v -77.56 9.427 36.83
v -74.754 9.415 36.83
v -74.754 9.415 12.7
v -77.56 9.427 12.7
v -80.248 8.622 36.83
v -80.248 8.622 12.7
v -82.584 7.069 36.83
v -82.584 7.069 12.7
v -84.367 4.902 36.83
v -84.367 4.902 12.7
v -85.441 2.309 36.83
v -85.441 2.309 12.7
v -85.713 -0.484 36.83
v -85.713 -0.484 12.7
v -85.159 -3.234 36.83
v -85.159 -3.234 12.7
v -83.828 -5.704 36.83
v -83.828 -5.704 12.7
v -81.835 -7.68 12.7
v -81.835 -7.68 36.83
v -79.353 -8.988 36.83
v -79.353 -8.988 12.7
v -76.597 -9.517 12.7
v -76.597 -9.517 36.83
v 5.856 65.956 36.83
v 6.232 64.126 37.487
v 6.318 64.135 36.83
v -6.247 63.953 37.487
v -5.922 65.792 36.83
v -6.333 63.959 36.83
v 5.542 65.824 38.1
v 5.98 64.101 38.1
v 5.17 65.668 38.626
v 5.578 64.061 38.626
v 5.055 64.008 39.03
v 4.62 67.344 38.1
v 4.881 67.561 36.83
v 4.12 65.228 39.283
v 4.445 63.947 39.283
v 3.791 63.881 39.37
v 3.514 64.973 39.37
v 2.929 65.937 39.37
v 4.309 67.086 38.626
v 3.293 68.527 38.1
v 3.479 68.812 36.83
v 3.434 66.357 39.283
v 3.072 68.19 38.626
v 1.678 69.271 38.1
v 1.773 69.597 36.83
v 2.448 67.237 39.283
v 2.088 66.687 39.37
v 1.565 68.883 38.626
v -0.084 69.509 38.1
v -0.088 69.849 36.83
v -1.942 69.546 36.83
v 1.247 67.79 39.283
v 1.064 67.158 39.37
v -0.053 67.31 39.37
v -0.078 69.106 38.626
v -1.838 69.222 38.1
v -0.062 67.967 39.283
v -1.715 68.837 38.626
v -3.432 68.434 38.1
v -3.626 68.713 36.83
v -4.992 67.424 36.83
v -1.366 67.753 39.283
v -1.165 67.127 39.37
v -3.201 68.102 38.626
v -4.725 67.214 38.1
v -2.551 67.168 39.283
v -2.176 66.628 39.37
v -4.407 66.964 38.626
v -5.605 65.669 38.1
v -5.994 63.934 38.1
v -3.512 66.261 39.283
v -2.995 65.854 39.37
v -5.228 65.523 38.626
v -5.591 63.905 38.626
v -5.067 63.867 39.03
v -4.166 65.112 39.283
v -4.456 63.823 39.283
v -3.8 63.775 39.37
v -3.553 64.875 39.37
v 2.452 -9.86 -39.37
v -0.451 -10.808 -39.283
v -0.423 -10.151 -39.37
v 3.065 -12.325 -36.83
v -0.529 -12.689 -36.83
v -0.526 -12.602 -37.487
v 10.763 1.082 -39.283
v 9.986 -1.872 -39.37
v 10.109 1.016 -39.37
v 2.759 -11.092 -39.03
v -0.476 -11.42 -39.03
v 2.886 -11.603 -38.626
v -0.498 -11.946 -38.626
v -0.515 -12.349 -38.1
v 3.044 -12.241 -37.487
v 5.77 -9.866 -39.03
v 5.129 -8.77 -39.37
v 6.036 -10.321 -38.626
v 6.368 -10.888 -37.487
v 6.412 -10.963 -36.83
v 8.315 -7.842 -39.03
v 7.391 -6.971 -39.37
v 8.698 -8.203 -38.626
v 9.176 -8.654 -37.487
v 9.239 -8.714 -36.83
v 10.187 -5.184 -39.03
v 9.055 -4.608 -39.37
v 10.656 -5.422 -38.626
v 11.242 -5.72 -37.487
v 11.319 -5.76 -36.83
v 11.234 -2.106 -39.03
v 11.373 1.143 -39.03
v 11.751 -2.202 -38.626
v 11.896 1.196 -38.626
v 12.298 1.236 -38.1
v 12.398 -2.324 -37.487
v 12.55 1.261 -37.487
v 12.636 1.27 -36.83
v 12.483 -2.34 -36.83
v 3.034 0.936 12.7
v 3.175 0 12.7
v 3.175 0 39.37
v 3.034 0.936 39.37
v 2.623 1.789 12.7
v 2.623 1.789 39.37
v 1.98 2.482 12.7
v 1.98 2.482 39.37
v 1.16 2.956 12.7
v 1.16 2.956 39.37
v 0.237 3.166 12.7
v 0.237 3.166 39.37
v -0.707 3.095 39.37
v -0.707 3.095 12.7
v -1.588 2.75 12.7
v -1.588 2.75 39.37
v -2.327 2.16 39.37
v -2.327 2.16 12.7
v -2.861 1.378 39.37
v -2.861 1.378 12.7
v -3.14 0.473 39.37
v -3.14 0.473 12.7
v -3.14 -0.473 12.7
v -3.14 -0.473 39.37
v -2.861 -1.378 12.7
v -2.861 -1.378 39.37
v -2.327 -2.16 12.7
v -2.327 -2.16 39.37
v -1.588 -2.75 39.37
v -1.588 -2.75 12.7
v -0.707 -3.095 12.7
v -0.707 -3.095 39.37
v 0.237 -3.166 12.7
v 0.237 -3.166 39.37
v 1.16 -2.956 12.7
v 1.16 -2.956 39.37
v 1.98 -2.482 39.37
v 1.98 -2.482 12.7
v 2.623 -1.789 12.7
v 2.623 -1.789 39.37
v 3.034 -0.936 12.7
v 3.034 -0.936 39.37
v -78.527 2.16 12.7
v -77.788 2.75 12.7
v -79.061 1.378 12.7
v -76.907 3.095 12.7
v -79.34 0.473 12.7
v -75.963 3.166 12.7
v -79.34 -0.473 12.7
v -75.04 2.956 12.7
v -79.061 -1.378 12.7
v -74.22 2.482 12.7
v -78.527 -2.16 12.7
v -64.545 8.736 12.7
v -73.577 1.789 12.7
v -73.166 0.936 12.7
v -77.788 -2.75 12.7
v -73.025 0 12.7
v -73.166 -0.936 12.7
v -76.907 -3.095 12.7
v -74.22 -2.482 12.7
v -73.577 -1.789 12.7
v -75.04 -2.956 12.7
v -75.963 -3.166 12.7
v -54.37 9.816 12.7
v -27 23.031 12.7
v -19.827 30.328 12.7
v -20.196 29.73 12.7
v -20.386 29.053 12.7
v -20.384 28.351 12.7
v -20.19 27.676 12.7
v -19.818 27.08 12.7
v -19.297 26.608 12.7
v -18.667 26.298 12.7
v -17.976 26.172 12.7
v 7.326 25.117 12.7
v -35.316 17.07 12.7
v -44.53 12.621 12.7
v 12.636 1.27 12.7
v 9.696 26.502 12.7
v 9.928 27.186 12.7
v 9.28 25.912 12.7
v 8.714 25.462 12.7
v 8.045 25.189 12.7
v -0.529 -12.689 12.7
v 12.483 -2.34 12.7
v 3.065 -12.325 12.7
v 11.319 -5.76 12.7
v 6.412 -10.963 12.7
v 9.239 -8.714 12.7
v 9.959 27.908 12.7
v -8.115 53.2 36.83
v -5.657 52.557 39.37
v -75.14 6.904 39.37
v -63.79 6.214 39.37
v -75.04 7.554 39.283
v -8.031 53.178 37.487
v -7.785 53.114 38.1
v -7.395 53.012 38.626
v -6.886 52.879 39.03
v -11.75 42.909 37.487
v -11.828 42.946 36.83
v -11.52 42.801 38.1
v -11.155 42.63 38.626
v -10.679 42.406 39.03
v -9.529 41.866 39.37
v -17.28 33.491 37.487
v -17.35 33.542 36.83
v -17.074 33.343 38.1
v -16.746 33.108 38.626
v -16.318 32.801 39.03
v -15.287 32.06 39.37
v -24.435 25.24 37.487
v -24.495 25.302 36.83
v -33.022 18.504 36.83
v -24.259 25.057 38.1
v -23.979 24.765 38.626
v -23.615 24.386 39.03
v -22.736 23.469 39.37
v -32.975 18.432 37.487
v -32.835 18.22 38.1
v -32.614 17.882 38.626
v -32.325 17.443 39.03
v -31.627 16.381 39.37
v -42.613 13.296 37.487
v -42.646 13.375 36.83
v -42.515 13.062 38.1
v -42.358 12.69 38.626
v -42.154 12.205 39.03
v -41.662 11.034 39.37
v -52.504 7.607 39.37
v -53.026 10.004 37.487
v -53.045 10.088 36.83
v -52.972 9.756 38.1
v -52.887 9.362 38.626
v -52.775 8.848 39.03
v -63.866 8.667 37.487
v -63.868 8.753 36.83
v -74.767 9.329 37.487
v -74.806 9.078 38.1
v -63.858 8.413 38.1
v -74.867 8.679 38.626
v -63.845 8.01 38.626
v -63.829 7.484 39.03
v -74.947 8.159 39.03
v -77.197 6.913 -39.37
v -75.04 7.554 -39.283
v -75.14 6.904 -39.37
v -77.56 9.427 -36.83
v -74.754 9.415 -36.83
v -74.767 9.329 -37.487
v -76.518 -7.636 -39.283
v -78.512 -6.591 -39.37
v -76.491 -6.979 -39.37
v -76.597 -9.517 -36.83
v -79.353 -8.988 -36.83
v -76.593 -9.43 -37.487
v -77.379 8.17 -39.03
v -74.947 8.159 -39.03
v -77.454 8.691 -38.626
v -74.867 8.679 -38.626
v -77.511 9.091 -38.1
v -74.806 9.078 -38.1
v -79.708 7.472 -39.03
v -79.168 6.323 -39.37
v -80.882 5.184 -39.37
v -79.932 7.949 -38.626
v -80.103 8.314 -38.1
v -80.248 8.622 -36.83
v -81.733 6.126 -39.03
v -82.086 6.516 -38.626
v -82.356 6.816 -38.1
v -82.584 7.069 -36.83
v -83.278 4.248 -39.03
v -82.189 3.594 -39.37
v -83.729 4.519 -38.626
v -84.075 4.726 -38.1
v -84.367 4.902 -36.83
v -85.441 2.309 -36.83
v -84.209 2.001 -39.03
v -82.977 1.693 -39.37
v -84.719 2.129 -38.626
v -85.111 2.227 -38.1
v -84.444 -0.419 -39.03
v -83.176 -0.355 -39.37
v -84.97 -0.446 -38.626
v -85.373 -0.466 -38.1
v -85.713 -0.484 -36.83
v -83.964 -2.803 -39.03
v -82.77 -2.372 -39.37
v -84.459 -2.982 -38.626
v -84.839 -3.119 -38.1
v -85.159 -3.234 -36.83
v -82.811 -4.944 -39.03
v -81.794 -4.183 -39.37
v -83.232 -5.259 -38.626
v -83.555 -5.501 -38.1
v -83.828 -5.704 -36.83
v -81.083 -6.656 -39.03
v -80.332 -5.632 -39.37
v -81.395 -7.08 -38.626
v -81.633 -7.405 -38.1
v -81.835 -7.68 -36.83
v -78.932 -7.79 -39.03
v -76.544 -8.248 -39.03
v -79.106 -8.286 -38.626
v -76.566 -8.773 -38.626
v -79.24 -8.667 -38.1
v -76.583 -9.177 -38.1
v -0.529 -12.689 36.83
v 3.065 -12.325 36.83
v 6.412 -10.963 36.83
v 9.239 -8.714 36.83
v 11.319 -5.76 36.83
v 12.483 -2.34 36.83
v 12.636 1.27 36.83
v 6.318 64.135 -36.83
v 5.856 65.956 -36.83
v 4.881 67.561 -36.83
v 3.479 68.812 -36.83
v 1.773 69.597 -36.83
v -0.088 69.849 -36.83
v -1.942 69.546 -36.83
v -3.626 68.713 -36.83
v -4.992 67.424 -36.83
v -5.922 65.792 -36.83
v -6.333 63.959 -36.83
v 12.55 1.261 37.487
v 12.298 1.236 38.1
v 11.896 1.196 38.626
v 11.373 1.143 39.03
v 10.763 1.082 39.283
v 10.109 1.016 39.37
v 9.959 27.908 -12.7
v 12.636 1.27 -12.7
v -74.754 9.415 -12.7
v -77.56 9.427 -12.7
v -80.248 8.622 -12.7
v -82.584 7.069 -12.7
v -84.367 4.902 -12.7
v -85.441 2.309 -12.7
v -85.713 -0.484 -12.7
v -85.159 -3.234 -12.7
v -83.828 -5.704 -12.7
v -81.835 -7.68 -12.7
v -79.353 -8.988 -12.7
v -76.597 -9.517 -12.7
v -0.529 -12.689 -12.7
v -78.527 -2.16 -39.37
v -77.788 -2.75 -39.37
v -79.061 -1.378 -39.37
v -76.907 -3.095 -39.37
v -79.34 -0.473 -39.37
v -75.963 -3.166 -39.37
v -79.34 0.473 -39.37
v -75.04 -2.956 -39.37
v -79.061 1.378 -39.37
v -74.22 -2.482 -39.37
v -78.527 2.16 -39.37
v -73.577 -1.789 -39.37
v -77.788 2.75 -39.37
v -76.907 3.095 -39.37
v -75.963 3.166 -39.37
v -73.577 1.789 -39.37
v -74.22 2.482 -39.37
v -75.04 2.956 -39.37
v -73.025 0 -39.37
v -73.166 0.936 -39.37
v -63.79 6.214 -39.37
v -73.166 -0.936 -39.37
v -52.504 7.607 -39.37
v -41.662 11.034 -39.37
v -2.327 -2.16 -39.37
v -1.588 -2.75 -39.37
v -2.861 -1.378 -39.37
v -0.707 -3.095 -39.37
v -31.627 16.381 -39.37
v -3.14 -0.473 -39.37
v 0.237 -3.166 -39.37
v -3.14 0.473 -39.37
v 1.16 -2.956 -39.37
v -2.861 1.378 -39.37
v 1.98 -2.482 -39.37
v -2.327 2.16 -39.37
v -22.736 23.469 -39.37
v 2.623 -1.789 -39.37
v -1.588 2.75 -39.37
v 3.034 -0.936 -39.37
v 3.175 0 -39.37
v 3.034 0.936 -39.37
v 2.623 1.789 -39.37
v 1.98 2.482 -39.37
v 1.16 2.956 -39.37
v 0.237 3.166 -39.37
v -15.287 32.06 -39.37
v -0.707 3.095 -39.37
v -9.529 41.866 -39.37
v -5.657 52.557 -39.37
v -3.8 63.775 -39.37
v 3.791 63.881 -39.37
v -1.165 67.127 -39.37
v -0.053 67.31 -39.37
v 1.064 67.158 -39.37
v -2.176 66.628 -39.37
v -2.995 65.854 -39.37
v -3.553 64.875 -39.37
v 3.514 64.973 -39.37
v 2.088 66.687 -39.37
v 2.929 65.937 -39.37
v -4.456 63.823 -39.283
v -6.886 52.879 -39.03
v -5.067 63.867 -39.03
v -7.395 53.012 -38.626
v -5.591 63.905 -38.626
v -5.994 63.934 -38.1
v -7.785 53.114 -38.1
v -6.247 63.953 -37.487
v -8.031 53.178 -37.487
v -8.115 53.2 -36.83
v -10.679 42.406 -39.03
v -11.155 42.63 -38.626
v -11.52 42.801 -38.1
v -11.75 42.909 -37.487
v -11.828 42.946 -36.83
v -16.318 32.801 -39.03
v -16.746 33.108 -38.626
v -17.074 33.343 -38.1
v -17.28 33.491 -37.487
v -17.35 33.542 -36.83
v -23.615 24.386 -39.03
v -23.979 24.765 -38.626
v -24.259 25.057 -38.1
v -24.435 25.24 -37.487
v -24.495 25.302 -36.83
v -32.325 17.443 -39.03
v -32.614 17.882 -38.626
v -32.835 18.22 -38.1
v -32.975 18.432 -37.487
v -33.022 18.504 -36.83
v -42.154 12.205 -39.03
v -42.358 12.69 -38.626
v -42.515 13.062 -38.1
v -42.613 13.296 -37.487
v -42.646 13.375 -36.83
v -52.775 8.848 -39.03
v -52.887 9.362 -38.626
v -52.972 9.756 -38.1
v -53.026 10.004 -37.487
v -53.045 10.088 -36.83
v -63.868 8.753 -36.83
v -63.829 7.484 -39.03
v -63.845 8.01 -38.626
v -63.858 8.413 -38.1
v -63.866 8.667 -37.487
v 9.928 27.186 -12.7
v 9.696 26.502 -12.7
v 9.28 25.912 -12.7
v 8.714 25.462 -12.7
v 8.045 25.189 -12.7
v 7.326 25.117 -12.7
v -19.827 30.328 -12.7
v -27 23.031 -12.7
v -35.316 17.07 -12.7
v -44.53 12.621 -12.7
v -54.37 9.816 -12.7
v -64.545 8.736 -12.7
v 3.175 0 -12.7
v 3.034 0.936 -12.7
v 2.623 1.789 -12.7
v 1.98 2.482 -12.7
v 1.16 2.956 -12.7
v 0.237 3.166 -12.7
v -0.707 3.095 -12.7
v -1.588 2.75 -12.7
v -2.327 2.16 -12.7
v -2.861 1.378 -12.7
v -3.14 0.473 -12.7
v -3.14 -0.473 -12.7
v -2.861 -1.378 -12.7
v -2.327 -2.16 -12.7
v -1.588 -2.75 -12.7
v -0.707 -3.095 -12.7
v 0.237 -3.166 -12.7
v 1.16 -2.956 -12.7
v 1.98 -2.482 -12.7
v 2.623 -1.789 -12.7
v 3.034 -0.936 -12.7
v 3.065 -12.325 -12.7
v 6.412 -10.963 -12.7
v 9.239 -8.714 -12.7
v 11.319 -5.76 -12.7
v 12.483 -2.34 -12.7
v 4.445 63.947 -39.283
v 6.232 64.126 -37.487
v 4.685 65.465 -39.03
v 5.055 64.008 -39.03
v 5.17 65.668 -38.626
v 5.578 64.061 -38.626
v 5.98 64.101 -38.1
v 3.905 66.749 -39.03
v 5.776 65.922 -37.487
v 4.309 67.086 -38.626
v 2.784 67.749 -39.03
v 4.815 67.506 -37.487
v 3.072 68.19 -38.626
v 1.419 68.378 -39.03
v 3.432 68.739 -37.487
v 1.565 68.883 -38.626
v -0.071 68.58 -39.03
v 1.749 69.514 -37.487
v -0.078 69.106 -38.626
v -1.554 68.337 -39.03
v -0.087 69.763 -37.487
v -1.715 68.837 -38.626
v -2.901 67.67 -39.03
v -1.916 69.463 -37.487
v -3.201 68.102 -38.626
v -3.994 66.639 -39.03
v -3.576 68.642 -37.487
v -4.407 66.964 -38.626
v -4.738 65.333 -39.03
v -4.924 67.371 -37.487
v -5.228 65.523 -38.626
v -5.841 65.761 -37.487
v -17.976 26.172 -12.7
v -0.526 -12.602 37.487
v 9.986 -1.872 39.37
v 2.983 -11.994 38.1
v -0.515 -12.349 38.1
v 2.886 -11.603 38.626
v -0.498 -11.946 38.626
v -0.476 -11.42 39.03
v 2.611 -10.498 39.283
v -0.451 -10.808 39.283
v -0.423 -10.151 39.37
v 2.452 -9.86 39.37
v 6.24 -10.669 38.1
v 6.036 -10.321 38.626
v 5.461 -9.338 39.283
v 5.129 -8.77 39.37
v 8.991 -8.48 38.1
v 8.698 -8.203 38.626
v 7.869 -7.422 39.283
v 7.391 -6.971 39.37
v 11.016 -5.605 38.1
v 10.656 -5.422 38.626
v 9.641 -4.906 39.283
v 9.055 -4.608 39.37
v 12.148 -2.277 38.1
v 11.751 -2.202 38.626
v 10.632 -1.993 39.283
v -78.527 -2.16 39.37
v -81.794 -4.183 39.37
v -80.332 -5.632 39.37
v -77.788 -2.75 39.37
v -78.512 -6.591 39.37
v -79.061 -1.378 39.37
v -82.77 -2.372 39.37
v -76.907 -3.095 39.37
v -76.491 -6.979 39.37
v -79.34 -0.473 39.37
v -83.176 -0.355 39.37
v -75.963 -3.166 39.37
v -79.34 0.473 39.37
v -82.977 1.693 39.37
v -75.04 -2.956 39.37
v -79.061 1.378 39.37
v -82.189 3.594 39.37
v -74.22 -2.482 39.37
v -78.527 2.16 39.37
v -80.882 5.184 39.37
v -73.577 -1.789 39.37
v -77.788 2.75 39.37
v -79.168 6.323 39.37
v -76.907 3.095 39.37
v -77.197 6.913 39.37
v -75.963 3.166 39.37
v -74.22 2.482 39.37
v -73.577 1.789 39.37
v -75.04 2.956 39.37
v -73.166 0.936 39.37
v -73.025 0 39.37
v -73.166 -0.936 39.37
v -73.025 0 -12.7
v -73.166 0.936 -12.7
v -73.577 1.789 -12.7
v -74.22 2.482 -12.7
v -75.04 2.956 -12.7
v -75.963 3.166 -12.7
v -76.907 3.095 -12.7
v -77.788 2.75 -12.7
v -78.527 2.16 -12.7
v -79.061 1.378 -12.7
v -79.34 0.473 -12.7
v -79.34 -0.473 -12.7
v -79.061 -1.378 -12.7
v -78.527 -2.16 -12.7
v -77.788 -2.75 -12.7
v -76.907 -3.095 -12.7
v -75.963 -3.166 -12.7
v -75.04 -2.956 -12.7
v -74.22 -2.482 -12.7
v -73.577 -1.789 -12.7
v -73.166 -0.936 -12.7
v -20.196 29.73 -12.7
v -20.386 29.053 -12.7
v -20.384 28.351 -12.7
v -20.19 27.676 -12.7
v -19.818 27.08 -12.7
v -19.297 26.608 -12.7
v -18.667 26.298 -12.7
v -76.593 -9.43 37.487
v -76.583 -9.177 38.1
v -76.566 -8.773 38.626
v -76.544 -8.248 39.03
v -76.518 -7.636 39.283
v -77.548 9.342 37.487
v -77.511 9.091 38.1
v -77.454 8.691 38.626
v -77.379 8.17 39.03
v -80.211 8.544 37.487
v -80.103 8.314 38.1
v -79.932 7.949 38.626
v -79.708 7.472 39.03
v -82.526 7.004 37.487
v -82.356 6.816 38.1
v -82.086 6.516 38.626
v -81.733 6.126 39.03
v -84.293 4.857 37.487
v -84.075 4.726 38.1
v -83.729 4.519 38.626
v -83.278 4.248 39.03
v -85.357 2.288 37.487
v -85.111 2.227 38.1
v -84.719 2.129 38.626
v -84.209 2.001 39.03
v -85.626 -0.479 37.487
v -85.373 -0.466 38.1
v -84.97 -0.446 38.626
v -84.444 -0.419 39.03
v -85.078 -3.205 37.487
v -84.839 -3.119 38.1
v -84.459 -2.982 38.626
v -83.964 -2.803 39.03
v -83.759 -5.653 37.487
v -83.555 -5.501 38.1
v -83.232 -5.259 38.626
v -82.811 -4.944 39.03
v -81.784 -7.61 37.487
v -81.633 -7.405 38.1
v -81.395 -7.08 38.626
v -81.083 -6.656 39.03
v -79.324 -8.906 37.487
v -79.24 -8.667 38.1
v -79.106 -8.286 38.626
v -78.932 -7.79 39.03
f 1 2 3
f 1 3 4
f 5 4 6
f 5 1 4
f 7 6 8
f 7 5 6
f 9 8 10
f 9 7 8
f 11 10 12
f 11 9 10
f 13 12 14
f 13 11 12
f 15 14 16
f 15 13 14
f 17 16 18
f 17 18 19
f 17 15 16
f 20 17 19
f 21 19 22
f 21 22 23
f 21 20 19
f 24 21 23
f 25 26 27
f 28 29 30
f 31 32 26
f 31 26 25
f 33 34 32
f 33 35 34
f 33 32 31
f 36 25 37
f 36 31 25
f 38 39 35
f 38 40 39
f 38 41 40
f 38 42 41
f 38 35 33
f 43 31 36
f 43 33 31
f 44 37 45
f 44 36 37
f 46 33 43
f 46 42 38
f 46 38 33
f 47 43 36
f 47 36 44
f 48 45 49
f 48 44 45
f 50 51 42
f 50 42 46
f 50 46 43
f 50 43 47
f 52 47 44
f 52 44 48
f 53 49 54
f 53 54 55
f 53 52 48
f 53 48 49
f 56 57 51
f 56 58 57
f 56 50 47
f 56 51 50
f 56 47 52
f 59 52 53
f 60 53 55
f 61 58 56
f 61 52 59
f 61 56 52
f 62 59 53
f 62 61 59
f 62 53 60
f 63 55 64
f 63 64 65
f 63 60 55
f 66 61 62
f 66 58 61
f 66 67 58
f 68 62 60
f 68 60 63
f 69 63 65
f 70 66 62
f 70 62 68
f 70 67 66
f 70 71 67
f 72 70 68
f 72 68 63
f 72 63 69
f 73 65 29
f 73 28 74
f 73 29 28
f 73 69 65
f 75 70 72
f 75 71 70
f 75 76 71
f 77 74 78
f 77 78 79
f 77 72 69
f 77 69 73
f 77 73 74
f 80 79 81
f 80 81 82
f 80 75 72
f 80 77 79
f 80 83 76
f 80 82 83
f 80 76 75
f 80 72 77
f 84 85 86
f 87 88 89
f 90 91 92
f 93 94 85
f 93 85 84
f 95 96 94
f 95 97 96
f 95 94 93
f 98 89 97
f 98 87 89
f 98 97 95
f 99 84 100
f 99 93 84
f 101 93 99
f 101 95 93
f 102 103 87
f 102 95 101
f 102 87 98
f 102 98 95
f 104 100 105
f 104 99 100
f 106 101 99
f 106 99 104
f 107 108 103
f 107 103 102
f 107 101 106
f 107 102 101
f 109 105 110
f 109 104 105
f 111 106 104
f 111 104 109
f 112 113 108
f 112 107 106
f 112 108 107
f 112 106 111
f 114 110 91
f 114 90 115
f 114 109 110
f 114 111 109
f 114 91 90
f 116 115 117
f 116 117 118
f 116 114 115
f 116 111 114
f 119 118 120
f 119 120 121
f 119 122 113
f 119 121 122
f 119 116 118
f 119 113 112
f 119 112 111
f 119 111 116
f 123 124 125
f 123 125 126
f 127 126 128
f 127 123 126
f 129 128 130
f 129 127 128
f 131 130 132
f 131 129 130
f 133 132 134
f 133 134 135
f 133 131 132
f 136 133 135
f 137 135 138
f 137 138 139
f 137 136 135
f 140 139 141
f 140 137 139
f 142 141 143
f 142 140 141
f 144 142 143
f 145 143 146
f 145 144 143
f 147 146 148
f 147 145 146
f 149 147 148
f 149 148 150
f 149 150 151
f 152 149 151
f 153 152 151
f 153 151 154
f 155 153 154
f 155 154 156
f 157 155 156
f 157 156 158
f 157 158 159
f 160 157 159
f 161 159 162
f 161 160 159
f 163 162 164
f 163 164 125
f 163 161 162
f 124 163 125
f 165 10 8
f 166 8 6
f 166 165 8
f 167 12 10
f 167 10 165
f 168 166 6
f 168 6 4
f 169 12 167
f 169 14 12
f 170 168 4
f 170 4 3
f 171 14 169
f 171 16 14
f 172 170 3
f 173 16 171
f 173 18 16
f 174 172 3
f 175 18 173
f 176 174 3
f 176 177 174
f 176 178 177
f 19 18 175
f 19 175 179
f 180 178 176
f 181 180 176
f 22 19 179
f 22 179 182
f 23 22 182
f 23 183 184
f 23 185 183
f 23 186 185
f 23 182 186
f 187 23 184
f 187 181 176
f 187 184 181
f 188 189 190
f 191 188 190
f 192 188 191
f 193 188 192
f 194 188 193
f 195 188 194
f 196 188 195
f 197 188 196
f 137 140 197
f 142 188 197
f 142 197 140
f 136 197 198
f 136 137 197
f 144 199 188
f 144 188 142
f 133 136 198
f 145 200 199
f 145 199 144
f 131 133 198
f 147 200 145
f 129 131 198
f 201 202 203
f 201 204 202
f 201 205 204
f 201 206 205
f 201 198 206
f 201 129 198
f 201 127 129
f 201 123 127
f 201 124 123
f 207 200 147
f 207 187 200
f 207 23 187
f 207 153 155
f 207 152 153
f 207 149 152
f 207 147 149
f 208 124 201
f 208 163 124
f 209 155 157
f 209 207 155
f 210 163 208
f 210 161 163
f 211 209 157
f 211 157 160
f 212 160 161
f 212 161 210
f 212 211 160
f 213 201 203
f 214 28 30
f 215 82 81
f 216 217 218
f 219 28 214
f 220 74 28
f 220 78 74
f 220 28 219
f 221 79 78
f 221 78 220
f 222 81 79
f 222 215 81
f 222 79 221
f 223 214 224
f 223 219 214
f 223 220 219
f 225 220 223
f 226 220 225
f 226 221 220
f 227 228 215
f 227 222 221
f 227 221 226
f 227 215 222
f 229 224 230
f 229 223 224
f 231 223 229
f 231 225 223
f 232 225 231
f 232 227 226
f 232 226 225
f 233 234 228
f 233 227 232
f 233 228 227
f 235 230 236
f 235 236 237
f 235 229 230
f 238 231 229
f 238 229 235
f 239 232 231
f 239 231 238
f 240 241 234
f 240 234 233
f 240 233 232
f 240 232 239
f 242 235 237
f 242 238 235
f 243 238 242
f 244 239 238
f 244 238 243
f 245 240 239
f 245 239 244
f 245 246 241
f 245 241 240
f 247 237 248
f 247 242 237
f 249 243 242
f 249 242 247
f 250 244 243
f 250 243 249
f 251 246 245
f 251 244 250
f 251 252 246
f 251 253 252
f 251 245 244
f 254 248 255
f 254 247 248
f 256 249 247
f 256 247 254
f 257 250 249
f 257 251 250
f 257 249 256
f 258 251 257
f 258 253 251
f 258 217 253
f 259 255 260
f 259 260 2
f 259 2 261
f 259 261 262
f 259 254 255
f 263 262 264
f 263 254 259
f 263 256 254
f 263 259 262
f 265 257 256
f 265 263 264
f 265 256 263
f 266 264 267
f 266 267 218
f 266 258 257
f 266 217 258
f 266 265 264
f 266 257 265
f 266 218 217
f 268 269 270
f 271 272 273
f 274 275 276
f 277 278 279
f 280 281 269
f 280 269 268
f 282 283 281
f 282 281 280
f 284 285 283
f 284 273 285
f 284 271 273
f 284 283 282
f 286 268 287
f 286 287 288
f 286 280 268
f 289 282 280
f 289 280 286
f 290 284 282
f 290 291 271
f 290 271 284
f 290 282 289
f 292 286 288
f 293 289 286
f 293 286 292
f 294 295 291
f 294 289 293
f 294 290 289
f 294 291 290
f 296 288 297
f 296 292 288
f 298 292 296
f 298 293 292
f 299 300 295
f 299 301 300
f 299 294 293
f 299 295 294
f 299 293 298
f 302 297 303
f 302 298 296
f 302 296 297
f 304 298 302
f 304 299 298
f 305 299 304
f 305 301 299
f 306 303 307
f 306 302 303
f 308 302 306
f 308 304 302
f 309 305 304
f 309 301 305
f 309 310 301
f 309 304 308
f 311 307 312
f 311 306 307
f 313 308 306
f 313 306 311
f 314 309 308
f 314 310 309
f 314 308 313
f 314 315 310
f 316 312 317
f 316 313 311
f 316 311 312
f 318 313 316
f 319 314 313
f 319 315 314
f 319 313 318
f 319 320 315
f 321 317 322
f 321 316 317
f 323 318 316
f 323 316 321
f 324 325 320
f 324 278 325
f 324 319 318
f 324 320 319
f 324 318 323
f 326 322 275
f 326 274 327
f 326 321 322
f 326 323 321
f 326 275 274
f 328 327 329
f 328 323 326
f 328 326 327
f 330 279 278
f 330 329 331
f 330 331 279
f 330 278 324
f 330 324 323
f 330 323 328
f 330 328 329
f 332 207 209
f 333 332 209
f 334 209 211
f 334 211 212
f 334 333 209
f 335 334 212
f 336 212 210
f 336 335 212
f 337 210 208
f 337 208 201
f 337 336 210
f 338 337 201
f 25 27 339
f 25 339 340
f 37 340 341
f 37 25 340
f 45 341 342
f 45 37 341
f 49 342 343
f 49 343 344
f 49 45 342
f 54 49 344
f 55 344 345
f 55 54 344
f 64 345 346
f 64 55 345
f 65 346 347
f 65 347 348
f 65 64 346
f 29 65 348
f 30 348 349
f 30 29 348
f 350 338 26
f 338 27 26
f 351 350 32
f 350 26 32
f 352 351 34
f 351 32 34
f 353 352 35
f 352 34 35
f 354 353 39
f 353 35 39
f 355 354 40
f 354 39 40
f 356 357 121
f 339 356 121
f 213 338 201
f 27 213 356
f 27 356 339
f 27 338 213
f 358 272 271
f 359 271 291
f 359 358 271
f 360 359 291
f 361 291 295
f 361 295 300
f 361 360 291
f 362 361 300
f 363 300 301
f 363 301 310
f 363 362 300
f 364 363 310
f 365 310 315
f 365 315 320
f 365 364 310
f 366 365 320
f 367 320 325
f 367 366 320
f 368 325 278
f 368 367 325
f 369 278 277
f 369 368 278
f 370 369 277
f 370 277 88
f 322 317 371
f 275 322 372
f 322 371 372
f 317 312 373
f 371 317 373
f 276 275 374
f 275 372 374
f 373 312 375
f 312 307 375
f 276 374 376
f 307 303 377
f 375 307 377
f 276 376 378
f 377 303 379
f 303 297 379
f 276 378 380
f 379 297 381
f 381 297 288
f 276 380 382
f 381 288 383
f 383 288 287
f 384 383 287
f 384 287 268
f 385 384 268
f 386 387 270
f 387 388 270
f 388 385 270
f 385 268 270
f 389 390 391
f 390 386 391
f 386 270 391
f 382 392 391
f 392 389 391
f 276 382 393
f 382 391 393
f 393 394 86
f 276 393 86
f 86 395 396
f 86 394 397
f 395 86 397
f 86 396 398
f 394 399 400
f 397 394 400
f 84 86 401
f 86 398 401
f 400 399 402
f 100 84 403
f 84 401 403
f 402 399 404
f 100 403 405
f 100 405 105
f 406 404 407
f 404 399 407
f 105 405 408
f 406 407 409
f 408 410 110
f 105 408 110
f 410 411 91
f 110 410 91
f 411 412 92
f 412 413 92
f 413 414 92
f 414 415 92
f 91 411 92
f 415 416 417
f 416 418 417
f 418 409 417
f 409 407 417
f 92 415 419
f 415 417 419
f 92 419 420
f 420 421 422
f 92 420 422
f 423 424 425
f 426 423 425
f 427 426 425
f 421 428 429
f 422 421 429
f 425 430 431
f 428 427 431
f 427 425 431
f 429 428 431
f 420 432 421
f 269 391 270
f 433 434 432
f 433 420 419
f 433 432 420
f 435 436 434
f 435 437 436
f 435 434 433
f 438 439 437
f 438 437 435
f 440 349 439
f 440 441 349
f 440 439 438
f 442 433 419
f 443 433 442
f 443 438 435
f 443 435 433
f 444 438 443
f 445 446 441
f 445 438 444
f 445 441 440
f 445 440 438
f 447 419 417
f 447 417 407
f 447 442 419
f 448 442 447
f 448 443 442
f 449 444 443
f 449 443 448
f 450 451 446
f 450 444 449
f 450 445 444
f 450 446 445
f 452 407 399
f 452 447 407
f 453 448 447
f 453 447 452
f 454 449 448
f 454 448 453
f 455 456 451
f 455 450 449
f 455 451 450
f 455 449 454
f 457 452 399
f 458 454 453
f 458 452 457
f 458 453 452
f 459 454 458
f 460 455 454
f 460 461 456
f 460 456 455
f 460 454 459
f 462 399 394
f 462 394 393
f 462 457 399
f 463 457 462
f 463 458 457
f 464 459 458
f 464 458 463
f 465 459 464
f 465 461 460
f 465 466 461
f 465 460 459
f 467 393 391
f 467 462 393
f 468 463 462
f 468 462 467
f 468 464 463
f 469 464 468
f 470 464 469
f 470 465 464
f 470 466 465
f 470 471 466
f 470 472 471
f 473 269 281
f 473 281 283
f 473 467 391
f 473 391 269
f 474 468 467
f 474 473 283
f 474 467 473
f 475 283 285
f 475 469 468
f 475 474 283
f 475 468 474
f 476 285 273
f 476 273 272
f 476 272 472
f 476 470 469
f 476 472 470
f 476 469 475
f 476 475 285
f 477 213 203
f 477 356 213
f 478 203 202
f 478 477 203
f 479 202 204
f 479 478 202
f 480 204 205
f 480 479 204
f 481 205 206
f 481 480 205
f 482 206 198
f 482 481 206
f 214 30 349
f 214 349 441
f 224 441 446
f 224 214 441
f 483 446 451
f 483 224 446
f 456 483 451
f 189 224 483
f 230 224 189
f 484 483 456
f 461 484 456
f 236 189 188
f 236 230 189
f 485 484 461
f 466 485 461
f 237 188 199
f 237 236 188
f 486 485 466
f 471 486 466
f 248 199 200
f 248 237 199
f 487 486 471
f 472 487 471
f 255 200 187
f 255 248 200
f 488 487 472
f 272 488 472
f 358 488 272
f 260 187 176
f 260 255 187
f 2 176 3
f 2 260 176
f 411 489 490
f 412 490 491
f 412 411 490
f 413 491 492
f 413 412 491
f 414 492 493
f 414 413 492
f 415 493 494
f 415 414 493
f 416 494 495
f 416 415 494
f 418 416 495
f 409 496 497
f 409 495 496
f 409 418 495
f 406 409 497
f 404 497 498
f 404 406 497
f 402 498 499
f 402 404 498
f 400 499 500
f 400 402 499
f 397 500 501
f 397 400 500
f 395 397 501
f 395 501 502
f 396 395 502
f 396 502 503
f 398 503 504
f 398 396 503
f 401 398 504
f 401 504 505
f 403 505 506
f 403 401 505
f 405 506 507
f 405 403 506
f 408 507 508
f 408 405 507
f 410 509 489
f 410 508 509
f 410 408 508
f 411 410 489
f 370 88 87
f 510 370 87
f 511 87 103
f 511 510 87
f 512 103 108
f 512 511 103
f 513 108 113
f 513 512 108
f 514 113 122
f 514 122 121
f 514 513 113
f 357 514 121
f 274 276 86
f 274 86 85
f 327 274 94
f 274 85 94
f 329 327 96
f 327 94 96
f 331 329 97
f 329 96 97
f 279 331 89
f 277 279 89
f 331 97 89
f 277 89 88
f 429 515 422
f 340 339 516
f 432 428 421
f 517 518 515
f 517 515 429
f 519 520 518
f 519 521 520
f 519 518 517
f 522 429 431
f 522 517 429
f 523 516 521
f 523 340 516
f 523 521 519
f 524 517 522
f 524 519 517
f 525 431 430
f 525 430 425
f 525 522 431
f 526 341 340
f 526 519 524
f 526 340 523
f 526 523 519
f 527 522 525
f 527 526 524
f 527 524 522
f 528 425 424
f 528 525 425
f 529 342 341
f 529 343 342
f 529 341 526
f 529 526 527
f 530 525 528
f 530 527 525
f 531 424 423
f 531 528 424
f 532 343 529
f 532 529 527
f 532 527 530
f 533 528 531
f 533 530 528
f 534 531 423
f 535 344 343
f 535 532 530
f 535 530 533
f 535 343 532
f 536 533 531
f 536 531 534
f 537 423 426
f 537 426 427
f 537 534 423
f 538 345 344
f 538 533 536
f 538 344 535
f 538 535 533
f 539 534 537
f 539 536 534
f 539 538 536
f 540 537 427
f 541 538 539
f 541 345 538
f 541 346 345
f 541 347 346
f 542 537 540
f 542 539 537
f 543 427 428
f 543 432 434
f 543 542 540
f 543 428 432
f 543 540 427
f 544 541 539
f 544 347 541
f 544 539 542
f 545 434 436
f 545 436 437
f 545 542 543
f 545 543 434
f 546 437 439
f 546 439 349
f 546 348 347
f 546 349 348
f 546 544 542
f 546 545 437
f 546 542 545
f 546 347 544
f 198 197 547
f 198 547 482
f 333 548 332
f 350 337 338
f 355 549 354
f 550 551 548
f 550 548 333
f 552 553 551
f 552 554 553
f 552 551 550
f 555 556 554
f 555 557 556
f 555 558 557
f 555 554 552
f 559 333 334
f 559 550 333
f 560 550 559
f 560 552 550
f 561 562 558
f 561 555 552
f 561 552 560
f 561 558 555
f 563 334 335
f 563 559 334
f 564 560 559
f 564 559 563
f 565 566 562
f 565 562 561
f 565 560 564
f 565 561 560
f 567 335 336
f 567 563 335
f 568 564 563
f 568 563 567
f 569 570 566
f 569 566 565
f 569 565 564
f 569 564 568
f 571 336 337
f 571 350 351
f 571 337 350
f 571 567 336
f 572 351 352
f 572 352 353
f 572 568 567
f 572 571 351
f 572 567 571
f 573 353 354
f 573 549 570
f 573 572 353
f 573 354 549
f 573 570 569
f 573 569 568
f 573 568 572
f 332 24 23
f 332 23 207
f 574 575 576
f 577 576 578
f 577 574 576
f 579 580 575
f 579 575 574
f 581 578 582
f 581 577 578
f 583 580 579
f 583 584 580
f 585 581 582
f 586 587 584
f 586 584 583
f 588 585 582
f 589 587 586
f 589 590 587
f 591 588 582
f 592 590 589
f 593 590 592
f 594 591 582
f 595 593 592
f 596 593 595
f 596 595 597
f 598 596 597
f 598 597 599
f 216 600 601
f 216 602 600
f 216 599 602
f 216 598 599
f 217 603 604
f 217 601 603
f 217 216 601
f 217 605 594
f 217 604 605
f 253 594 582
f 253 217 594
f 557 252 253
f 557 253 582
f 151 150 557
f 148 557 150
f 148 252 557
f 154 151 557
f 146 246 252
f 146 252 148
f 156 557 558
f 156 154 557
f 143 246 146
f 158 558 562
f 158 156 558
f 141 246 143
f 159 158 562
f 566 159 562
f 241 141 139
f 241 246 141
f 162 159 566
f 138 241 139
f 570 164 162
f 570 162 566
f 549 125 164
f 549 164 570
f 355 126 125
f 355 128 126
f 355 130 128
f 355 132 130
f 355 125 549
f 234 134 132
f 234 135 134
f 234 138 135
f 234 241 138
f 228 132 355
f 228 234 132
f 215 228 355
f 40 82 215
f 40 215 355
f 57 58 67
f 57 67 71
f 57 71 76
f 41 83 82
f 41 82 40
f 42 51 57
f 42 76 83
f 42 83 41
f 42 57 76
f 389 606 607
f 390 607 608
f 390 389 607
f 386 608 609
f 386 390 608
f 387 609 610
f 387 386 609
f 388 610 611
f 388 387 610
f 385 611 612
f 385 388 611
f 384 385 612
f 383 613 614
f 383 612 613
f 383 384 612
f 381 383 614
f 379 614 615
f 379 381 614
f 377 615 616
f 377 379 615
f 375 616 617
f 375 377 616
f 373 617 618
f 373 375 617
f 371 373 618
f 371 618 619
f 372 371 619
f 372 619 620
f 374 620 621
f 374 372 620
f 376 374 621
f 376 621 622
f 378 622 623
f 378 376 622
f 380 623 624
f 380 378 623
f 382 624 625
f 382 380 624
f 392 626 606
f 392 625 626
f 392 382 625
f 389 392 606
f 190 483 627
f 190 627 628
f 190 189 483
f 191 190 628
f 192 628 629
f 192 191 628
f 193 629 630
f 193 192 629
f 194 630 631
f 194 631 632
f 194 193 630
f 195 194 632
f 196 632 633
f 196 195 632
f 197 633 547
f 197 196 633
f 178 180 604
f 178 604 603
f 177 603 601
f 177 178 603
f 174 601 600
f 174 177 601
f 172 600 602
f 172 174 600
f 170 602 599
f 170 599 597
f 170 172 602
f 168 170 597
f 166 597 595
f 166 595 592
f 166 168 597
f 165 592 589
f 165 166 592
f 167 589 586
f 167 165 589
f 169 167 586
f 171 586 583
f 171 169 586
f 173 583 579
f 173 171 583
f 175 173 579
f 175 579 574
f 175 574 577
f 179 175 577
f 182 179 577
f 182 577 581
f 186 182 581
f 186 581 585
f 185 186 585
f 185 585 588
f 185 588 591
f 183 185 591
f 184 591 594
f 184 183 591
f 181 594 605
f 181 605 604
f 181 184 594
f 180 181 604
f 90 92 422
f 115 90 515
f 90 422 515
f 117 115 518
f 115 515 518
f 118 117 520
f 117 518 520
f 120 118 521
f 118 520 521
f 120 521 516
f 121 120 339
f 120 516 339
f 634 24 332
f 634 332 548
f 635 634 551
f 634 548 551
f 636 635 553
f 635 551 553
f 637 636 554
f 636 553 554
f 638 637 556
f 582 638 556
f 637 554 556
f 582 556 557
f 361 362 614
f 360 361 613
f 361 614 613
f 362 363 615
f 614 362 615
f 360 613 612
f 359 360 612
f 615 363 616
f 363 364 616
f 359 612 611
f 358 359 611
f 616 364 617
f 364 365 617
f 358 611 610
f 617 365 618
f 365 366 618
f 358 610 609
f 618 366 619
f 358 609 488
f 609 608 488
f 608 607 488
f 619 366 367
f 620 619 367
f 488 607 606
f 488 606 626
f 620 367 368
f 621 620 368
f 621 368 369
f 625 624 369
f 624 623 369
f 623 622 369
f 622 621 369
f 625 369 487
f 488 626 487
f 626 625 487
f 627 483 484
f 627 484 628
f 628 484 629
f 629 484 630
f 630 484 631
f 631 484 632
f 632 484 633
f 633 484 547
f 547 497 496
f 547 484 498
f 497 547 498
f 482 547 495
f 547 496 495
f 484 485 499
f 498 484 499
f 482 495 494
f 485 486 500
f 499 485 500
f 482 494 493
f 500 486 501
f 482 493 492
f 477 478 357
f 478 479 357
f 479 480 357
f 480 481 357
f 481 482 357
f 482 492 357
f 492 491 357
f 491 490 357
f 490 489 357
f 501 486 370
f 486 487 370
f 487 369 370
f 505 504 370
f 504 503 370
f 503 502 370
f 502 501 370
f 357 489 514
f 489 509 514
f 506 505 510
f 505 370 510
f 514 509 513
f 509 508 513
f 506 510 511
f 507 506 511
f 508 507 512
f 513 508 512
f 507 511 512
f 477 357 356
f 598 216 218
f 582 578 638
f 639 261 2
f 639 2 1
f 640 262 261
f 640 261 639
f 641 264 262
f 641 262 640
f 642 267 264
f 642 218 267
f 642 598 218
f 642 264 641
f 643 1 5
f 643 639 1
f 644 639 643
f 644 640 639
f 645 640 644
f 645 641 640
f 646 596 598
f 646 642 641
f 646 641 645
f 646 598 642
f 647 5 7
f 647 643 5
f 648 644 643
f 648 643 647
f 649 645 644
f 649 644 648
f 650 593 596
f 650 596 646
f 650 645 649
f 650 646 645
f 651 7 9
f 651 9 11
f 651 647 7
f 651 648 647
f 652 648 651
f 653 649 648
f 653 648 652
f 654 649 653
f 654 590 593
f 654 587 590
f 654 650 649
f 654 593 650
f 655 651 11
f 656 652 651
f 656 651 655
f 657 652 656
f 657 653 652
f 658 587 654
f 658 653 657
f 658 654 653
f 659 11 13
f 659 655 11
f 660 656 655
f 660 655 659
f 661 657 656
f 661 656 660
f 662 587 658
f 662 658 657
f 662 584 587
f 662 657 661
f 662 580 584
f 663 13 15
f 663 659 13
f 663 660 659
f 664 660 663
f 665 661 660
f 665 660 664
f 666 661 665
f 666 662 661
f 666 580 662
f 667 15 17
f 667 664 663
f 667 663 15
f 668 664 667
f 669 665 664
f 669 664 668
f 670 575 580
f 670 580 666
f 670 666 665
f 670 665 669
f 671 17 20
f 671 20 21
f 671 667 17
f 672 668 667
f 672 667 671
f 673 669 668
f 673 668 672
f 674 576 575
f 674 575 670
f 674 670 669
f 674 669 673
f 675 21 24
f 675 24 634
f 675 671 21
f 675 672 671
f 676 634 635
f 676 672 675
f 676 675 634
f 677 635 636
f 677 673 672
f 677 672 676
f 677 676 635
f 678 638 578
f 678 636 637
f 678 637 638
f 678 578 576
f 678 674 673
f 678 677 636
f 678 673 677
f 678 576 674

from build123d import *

# Parameters (mm, degrees)
SKETCH1_R           = 3.175
BOSS_EXTRUDE1_DEPTH = 39.37
SKETCH3_W           = 153.048335432
SKETCH3_H           = 25.4
CUT_EXTRUDE1_DEPTH  = 38.1
FILLET1_R           = 2.54
FILLET2_R           = 2.54


with BuildPart() as part:
    # Sketch1 → Boss-Extrude1 (new, symmetric)
    with BuildSketch(Plane.XY):
        with BuildLine():
            Line((-76.596875, -9.516728179), (-0.529166667, -12.688970905))
            ThreePointArc((-0.529166667, -12.688970905), (9.239000565, -8.713832025), (12.636340451, 1.27))
            Line((12.636340451, 1.27), (6.318170226, 64.135))
            ThreePointArc((6.318170226, 64.135), (-0.08833437, 69.849385564), (-6.333390084, 63.95898807))
            ThreePointArc((-6.333390084, 63.95898807), (-28.602299903, 21.707467551), (-74.754015102, 9.414603161))
            ThreePointArc((-74.754015102, 9.414603161), (-85.680189052, 0.922843719), (-76.596875, -9.516728179))
        make_face()
        with Locations((-76.2, 0)):
            Circle(SKETCH1_R, mode=Mode.SUBTRACT)
        Circle(SKETCH1_R, mode=Mode.SUBTRACT)
    extrude(amount=BOSS_EXTRUDE1_DEPTH, both=True)

    # Sketch3 → Cut-Extrude1 (cut)
    with BuildSketch(Plane(origin=(-0.529166667, -12.688970905, 0), x_dir=(0.9991315673568165, -0.04166666666666664, 0), z_dir=(-0.04166666666666664, -0.9991315673568165, 0))):
        with Locations((-41.471397415, 0)):
            Rectangle(SKETCH3_W, SKETCH3_H)
    extrude(amount=-CUT_EXTRUDE1_DEPTH, mode=Mode.SUBTRACT)

    # Fillet1
    fillet1_edges = [part.edges().sort_by_distance(p)[0] for p in [
        (-23.382807479, 26.397207842, 0),
        (10.25193425, 24.994542149, 0),
    ]]
    fillet(fillet1_edges, radius=FILLET1_R)

    # Fillet2
    fillet2_edges = [part.edges().sort_by_distance(p)[0] for p in [
        (-0.08833437, 69.849385564, 39.37),
        (-28.602299903, 21.707467551, 39.37),
        (-85.680189052, 0.922843719, 39.37),
        (-38.563020833, -11.102849542, 39.37),
        (9.239000565, -8.713832025, 39.37),
        (-38.563020833, -11.102849542, -39.37),
        (-85.680189052, 0.922843719, -39.37),
        (-28.602299903, 21.707467551, -39.37),
        (9.477255338, 32.7025, 39.37),
        (-0.08833437, 69.849385564, -39.37),
        (9.477255338, 32.7025, -39.37),
        (9.239000565, -8.713832025, -39.37),
    ]]
    fillet(fillet2_edges, radius=FILLET2_R)


solid = part.part
